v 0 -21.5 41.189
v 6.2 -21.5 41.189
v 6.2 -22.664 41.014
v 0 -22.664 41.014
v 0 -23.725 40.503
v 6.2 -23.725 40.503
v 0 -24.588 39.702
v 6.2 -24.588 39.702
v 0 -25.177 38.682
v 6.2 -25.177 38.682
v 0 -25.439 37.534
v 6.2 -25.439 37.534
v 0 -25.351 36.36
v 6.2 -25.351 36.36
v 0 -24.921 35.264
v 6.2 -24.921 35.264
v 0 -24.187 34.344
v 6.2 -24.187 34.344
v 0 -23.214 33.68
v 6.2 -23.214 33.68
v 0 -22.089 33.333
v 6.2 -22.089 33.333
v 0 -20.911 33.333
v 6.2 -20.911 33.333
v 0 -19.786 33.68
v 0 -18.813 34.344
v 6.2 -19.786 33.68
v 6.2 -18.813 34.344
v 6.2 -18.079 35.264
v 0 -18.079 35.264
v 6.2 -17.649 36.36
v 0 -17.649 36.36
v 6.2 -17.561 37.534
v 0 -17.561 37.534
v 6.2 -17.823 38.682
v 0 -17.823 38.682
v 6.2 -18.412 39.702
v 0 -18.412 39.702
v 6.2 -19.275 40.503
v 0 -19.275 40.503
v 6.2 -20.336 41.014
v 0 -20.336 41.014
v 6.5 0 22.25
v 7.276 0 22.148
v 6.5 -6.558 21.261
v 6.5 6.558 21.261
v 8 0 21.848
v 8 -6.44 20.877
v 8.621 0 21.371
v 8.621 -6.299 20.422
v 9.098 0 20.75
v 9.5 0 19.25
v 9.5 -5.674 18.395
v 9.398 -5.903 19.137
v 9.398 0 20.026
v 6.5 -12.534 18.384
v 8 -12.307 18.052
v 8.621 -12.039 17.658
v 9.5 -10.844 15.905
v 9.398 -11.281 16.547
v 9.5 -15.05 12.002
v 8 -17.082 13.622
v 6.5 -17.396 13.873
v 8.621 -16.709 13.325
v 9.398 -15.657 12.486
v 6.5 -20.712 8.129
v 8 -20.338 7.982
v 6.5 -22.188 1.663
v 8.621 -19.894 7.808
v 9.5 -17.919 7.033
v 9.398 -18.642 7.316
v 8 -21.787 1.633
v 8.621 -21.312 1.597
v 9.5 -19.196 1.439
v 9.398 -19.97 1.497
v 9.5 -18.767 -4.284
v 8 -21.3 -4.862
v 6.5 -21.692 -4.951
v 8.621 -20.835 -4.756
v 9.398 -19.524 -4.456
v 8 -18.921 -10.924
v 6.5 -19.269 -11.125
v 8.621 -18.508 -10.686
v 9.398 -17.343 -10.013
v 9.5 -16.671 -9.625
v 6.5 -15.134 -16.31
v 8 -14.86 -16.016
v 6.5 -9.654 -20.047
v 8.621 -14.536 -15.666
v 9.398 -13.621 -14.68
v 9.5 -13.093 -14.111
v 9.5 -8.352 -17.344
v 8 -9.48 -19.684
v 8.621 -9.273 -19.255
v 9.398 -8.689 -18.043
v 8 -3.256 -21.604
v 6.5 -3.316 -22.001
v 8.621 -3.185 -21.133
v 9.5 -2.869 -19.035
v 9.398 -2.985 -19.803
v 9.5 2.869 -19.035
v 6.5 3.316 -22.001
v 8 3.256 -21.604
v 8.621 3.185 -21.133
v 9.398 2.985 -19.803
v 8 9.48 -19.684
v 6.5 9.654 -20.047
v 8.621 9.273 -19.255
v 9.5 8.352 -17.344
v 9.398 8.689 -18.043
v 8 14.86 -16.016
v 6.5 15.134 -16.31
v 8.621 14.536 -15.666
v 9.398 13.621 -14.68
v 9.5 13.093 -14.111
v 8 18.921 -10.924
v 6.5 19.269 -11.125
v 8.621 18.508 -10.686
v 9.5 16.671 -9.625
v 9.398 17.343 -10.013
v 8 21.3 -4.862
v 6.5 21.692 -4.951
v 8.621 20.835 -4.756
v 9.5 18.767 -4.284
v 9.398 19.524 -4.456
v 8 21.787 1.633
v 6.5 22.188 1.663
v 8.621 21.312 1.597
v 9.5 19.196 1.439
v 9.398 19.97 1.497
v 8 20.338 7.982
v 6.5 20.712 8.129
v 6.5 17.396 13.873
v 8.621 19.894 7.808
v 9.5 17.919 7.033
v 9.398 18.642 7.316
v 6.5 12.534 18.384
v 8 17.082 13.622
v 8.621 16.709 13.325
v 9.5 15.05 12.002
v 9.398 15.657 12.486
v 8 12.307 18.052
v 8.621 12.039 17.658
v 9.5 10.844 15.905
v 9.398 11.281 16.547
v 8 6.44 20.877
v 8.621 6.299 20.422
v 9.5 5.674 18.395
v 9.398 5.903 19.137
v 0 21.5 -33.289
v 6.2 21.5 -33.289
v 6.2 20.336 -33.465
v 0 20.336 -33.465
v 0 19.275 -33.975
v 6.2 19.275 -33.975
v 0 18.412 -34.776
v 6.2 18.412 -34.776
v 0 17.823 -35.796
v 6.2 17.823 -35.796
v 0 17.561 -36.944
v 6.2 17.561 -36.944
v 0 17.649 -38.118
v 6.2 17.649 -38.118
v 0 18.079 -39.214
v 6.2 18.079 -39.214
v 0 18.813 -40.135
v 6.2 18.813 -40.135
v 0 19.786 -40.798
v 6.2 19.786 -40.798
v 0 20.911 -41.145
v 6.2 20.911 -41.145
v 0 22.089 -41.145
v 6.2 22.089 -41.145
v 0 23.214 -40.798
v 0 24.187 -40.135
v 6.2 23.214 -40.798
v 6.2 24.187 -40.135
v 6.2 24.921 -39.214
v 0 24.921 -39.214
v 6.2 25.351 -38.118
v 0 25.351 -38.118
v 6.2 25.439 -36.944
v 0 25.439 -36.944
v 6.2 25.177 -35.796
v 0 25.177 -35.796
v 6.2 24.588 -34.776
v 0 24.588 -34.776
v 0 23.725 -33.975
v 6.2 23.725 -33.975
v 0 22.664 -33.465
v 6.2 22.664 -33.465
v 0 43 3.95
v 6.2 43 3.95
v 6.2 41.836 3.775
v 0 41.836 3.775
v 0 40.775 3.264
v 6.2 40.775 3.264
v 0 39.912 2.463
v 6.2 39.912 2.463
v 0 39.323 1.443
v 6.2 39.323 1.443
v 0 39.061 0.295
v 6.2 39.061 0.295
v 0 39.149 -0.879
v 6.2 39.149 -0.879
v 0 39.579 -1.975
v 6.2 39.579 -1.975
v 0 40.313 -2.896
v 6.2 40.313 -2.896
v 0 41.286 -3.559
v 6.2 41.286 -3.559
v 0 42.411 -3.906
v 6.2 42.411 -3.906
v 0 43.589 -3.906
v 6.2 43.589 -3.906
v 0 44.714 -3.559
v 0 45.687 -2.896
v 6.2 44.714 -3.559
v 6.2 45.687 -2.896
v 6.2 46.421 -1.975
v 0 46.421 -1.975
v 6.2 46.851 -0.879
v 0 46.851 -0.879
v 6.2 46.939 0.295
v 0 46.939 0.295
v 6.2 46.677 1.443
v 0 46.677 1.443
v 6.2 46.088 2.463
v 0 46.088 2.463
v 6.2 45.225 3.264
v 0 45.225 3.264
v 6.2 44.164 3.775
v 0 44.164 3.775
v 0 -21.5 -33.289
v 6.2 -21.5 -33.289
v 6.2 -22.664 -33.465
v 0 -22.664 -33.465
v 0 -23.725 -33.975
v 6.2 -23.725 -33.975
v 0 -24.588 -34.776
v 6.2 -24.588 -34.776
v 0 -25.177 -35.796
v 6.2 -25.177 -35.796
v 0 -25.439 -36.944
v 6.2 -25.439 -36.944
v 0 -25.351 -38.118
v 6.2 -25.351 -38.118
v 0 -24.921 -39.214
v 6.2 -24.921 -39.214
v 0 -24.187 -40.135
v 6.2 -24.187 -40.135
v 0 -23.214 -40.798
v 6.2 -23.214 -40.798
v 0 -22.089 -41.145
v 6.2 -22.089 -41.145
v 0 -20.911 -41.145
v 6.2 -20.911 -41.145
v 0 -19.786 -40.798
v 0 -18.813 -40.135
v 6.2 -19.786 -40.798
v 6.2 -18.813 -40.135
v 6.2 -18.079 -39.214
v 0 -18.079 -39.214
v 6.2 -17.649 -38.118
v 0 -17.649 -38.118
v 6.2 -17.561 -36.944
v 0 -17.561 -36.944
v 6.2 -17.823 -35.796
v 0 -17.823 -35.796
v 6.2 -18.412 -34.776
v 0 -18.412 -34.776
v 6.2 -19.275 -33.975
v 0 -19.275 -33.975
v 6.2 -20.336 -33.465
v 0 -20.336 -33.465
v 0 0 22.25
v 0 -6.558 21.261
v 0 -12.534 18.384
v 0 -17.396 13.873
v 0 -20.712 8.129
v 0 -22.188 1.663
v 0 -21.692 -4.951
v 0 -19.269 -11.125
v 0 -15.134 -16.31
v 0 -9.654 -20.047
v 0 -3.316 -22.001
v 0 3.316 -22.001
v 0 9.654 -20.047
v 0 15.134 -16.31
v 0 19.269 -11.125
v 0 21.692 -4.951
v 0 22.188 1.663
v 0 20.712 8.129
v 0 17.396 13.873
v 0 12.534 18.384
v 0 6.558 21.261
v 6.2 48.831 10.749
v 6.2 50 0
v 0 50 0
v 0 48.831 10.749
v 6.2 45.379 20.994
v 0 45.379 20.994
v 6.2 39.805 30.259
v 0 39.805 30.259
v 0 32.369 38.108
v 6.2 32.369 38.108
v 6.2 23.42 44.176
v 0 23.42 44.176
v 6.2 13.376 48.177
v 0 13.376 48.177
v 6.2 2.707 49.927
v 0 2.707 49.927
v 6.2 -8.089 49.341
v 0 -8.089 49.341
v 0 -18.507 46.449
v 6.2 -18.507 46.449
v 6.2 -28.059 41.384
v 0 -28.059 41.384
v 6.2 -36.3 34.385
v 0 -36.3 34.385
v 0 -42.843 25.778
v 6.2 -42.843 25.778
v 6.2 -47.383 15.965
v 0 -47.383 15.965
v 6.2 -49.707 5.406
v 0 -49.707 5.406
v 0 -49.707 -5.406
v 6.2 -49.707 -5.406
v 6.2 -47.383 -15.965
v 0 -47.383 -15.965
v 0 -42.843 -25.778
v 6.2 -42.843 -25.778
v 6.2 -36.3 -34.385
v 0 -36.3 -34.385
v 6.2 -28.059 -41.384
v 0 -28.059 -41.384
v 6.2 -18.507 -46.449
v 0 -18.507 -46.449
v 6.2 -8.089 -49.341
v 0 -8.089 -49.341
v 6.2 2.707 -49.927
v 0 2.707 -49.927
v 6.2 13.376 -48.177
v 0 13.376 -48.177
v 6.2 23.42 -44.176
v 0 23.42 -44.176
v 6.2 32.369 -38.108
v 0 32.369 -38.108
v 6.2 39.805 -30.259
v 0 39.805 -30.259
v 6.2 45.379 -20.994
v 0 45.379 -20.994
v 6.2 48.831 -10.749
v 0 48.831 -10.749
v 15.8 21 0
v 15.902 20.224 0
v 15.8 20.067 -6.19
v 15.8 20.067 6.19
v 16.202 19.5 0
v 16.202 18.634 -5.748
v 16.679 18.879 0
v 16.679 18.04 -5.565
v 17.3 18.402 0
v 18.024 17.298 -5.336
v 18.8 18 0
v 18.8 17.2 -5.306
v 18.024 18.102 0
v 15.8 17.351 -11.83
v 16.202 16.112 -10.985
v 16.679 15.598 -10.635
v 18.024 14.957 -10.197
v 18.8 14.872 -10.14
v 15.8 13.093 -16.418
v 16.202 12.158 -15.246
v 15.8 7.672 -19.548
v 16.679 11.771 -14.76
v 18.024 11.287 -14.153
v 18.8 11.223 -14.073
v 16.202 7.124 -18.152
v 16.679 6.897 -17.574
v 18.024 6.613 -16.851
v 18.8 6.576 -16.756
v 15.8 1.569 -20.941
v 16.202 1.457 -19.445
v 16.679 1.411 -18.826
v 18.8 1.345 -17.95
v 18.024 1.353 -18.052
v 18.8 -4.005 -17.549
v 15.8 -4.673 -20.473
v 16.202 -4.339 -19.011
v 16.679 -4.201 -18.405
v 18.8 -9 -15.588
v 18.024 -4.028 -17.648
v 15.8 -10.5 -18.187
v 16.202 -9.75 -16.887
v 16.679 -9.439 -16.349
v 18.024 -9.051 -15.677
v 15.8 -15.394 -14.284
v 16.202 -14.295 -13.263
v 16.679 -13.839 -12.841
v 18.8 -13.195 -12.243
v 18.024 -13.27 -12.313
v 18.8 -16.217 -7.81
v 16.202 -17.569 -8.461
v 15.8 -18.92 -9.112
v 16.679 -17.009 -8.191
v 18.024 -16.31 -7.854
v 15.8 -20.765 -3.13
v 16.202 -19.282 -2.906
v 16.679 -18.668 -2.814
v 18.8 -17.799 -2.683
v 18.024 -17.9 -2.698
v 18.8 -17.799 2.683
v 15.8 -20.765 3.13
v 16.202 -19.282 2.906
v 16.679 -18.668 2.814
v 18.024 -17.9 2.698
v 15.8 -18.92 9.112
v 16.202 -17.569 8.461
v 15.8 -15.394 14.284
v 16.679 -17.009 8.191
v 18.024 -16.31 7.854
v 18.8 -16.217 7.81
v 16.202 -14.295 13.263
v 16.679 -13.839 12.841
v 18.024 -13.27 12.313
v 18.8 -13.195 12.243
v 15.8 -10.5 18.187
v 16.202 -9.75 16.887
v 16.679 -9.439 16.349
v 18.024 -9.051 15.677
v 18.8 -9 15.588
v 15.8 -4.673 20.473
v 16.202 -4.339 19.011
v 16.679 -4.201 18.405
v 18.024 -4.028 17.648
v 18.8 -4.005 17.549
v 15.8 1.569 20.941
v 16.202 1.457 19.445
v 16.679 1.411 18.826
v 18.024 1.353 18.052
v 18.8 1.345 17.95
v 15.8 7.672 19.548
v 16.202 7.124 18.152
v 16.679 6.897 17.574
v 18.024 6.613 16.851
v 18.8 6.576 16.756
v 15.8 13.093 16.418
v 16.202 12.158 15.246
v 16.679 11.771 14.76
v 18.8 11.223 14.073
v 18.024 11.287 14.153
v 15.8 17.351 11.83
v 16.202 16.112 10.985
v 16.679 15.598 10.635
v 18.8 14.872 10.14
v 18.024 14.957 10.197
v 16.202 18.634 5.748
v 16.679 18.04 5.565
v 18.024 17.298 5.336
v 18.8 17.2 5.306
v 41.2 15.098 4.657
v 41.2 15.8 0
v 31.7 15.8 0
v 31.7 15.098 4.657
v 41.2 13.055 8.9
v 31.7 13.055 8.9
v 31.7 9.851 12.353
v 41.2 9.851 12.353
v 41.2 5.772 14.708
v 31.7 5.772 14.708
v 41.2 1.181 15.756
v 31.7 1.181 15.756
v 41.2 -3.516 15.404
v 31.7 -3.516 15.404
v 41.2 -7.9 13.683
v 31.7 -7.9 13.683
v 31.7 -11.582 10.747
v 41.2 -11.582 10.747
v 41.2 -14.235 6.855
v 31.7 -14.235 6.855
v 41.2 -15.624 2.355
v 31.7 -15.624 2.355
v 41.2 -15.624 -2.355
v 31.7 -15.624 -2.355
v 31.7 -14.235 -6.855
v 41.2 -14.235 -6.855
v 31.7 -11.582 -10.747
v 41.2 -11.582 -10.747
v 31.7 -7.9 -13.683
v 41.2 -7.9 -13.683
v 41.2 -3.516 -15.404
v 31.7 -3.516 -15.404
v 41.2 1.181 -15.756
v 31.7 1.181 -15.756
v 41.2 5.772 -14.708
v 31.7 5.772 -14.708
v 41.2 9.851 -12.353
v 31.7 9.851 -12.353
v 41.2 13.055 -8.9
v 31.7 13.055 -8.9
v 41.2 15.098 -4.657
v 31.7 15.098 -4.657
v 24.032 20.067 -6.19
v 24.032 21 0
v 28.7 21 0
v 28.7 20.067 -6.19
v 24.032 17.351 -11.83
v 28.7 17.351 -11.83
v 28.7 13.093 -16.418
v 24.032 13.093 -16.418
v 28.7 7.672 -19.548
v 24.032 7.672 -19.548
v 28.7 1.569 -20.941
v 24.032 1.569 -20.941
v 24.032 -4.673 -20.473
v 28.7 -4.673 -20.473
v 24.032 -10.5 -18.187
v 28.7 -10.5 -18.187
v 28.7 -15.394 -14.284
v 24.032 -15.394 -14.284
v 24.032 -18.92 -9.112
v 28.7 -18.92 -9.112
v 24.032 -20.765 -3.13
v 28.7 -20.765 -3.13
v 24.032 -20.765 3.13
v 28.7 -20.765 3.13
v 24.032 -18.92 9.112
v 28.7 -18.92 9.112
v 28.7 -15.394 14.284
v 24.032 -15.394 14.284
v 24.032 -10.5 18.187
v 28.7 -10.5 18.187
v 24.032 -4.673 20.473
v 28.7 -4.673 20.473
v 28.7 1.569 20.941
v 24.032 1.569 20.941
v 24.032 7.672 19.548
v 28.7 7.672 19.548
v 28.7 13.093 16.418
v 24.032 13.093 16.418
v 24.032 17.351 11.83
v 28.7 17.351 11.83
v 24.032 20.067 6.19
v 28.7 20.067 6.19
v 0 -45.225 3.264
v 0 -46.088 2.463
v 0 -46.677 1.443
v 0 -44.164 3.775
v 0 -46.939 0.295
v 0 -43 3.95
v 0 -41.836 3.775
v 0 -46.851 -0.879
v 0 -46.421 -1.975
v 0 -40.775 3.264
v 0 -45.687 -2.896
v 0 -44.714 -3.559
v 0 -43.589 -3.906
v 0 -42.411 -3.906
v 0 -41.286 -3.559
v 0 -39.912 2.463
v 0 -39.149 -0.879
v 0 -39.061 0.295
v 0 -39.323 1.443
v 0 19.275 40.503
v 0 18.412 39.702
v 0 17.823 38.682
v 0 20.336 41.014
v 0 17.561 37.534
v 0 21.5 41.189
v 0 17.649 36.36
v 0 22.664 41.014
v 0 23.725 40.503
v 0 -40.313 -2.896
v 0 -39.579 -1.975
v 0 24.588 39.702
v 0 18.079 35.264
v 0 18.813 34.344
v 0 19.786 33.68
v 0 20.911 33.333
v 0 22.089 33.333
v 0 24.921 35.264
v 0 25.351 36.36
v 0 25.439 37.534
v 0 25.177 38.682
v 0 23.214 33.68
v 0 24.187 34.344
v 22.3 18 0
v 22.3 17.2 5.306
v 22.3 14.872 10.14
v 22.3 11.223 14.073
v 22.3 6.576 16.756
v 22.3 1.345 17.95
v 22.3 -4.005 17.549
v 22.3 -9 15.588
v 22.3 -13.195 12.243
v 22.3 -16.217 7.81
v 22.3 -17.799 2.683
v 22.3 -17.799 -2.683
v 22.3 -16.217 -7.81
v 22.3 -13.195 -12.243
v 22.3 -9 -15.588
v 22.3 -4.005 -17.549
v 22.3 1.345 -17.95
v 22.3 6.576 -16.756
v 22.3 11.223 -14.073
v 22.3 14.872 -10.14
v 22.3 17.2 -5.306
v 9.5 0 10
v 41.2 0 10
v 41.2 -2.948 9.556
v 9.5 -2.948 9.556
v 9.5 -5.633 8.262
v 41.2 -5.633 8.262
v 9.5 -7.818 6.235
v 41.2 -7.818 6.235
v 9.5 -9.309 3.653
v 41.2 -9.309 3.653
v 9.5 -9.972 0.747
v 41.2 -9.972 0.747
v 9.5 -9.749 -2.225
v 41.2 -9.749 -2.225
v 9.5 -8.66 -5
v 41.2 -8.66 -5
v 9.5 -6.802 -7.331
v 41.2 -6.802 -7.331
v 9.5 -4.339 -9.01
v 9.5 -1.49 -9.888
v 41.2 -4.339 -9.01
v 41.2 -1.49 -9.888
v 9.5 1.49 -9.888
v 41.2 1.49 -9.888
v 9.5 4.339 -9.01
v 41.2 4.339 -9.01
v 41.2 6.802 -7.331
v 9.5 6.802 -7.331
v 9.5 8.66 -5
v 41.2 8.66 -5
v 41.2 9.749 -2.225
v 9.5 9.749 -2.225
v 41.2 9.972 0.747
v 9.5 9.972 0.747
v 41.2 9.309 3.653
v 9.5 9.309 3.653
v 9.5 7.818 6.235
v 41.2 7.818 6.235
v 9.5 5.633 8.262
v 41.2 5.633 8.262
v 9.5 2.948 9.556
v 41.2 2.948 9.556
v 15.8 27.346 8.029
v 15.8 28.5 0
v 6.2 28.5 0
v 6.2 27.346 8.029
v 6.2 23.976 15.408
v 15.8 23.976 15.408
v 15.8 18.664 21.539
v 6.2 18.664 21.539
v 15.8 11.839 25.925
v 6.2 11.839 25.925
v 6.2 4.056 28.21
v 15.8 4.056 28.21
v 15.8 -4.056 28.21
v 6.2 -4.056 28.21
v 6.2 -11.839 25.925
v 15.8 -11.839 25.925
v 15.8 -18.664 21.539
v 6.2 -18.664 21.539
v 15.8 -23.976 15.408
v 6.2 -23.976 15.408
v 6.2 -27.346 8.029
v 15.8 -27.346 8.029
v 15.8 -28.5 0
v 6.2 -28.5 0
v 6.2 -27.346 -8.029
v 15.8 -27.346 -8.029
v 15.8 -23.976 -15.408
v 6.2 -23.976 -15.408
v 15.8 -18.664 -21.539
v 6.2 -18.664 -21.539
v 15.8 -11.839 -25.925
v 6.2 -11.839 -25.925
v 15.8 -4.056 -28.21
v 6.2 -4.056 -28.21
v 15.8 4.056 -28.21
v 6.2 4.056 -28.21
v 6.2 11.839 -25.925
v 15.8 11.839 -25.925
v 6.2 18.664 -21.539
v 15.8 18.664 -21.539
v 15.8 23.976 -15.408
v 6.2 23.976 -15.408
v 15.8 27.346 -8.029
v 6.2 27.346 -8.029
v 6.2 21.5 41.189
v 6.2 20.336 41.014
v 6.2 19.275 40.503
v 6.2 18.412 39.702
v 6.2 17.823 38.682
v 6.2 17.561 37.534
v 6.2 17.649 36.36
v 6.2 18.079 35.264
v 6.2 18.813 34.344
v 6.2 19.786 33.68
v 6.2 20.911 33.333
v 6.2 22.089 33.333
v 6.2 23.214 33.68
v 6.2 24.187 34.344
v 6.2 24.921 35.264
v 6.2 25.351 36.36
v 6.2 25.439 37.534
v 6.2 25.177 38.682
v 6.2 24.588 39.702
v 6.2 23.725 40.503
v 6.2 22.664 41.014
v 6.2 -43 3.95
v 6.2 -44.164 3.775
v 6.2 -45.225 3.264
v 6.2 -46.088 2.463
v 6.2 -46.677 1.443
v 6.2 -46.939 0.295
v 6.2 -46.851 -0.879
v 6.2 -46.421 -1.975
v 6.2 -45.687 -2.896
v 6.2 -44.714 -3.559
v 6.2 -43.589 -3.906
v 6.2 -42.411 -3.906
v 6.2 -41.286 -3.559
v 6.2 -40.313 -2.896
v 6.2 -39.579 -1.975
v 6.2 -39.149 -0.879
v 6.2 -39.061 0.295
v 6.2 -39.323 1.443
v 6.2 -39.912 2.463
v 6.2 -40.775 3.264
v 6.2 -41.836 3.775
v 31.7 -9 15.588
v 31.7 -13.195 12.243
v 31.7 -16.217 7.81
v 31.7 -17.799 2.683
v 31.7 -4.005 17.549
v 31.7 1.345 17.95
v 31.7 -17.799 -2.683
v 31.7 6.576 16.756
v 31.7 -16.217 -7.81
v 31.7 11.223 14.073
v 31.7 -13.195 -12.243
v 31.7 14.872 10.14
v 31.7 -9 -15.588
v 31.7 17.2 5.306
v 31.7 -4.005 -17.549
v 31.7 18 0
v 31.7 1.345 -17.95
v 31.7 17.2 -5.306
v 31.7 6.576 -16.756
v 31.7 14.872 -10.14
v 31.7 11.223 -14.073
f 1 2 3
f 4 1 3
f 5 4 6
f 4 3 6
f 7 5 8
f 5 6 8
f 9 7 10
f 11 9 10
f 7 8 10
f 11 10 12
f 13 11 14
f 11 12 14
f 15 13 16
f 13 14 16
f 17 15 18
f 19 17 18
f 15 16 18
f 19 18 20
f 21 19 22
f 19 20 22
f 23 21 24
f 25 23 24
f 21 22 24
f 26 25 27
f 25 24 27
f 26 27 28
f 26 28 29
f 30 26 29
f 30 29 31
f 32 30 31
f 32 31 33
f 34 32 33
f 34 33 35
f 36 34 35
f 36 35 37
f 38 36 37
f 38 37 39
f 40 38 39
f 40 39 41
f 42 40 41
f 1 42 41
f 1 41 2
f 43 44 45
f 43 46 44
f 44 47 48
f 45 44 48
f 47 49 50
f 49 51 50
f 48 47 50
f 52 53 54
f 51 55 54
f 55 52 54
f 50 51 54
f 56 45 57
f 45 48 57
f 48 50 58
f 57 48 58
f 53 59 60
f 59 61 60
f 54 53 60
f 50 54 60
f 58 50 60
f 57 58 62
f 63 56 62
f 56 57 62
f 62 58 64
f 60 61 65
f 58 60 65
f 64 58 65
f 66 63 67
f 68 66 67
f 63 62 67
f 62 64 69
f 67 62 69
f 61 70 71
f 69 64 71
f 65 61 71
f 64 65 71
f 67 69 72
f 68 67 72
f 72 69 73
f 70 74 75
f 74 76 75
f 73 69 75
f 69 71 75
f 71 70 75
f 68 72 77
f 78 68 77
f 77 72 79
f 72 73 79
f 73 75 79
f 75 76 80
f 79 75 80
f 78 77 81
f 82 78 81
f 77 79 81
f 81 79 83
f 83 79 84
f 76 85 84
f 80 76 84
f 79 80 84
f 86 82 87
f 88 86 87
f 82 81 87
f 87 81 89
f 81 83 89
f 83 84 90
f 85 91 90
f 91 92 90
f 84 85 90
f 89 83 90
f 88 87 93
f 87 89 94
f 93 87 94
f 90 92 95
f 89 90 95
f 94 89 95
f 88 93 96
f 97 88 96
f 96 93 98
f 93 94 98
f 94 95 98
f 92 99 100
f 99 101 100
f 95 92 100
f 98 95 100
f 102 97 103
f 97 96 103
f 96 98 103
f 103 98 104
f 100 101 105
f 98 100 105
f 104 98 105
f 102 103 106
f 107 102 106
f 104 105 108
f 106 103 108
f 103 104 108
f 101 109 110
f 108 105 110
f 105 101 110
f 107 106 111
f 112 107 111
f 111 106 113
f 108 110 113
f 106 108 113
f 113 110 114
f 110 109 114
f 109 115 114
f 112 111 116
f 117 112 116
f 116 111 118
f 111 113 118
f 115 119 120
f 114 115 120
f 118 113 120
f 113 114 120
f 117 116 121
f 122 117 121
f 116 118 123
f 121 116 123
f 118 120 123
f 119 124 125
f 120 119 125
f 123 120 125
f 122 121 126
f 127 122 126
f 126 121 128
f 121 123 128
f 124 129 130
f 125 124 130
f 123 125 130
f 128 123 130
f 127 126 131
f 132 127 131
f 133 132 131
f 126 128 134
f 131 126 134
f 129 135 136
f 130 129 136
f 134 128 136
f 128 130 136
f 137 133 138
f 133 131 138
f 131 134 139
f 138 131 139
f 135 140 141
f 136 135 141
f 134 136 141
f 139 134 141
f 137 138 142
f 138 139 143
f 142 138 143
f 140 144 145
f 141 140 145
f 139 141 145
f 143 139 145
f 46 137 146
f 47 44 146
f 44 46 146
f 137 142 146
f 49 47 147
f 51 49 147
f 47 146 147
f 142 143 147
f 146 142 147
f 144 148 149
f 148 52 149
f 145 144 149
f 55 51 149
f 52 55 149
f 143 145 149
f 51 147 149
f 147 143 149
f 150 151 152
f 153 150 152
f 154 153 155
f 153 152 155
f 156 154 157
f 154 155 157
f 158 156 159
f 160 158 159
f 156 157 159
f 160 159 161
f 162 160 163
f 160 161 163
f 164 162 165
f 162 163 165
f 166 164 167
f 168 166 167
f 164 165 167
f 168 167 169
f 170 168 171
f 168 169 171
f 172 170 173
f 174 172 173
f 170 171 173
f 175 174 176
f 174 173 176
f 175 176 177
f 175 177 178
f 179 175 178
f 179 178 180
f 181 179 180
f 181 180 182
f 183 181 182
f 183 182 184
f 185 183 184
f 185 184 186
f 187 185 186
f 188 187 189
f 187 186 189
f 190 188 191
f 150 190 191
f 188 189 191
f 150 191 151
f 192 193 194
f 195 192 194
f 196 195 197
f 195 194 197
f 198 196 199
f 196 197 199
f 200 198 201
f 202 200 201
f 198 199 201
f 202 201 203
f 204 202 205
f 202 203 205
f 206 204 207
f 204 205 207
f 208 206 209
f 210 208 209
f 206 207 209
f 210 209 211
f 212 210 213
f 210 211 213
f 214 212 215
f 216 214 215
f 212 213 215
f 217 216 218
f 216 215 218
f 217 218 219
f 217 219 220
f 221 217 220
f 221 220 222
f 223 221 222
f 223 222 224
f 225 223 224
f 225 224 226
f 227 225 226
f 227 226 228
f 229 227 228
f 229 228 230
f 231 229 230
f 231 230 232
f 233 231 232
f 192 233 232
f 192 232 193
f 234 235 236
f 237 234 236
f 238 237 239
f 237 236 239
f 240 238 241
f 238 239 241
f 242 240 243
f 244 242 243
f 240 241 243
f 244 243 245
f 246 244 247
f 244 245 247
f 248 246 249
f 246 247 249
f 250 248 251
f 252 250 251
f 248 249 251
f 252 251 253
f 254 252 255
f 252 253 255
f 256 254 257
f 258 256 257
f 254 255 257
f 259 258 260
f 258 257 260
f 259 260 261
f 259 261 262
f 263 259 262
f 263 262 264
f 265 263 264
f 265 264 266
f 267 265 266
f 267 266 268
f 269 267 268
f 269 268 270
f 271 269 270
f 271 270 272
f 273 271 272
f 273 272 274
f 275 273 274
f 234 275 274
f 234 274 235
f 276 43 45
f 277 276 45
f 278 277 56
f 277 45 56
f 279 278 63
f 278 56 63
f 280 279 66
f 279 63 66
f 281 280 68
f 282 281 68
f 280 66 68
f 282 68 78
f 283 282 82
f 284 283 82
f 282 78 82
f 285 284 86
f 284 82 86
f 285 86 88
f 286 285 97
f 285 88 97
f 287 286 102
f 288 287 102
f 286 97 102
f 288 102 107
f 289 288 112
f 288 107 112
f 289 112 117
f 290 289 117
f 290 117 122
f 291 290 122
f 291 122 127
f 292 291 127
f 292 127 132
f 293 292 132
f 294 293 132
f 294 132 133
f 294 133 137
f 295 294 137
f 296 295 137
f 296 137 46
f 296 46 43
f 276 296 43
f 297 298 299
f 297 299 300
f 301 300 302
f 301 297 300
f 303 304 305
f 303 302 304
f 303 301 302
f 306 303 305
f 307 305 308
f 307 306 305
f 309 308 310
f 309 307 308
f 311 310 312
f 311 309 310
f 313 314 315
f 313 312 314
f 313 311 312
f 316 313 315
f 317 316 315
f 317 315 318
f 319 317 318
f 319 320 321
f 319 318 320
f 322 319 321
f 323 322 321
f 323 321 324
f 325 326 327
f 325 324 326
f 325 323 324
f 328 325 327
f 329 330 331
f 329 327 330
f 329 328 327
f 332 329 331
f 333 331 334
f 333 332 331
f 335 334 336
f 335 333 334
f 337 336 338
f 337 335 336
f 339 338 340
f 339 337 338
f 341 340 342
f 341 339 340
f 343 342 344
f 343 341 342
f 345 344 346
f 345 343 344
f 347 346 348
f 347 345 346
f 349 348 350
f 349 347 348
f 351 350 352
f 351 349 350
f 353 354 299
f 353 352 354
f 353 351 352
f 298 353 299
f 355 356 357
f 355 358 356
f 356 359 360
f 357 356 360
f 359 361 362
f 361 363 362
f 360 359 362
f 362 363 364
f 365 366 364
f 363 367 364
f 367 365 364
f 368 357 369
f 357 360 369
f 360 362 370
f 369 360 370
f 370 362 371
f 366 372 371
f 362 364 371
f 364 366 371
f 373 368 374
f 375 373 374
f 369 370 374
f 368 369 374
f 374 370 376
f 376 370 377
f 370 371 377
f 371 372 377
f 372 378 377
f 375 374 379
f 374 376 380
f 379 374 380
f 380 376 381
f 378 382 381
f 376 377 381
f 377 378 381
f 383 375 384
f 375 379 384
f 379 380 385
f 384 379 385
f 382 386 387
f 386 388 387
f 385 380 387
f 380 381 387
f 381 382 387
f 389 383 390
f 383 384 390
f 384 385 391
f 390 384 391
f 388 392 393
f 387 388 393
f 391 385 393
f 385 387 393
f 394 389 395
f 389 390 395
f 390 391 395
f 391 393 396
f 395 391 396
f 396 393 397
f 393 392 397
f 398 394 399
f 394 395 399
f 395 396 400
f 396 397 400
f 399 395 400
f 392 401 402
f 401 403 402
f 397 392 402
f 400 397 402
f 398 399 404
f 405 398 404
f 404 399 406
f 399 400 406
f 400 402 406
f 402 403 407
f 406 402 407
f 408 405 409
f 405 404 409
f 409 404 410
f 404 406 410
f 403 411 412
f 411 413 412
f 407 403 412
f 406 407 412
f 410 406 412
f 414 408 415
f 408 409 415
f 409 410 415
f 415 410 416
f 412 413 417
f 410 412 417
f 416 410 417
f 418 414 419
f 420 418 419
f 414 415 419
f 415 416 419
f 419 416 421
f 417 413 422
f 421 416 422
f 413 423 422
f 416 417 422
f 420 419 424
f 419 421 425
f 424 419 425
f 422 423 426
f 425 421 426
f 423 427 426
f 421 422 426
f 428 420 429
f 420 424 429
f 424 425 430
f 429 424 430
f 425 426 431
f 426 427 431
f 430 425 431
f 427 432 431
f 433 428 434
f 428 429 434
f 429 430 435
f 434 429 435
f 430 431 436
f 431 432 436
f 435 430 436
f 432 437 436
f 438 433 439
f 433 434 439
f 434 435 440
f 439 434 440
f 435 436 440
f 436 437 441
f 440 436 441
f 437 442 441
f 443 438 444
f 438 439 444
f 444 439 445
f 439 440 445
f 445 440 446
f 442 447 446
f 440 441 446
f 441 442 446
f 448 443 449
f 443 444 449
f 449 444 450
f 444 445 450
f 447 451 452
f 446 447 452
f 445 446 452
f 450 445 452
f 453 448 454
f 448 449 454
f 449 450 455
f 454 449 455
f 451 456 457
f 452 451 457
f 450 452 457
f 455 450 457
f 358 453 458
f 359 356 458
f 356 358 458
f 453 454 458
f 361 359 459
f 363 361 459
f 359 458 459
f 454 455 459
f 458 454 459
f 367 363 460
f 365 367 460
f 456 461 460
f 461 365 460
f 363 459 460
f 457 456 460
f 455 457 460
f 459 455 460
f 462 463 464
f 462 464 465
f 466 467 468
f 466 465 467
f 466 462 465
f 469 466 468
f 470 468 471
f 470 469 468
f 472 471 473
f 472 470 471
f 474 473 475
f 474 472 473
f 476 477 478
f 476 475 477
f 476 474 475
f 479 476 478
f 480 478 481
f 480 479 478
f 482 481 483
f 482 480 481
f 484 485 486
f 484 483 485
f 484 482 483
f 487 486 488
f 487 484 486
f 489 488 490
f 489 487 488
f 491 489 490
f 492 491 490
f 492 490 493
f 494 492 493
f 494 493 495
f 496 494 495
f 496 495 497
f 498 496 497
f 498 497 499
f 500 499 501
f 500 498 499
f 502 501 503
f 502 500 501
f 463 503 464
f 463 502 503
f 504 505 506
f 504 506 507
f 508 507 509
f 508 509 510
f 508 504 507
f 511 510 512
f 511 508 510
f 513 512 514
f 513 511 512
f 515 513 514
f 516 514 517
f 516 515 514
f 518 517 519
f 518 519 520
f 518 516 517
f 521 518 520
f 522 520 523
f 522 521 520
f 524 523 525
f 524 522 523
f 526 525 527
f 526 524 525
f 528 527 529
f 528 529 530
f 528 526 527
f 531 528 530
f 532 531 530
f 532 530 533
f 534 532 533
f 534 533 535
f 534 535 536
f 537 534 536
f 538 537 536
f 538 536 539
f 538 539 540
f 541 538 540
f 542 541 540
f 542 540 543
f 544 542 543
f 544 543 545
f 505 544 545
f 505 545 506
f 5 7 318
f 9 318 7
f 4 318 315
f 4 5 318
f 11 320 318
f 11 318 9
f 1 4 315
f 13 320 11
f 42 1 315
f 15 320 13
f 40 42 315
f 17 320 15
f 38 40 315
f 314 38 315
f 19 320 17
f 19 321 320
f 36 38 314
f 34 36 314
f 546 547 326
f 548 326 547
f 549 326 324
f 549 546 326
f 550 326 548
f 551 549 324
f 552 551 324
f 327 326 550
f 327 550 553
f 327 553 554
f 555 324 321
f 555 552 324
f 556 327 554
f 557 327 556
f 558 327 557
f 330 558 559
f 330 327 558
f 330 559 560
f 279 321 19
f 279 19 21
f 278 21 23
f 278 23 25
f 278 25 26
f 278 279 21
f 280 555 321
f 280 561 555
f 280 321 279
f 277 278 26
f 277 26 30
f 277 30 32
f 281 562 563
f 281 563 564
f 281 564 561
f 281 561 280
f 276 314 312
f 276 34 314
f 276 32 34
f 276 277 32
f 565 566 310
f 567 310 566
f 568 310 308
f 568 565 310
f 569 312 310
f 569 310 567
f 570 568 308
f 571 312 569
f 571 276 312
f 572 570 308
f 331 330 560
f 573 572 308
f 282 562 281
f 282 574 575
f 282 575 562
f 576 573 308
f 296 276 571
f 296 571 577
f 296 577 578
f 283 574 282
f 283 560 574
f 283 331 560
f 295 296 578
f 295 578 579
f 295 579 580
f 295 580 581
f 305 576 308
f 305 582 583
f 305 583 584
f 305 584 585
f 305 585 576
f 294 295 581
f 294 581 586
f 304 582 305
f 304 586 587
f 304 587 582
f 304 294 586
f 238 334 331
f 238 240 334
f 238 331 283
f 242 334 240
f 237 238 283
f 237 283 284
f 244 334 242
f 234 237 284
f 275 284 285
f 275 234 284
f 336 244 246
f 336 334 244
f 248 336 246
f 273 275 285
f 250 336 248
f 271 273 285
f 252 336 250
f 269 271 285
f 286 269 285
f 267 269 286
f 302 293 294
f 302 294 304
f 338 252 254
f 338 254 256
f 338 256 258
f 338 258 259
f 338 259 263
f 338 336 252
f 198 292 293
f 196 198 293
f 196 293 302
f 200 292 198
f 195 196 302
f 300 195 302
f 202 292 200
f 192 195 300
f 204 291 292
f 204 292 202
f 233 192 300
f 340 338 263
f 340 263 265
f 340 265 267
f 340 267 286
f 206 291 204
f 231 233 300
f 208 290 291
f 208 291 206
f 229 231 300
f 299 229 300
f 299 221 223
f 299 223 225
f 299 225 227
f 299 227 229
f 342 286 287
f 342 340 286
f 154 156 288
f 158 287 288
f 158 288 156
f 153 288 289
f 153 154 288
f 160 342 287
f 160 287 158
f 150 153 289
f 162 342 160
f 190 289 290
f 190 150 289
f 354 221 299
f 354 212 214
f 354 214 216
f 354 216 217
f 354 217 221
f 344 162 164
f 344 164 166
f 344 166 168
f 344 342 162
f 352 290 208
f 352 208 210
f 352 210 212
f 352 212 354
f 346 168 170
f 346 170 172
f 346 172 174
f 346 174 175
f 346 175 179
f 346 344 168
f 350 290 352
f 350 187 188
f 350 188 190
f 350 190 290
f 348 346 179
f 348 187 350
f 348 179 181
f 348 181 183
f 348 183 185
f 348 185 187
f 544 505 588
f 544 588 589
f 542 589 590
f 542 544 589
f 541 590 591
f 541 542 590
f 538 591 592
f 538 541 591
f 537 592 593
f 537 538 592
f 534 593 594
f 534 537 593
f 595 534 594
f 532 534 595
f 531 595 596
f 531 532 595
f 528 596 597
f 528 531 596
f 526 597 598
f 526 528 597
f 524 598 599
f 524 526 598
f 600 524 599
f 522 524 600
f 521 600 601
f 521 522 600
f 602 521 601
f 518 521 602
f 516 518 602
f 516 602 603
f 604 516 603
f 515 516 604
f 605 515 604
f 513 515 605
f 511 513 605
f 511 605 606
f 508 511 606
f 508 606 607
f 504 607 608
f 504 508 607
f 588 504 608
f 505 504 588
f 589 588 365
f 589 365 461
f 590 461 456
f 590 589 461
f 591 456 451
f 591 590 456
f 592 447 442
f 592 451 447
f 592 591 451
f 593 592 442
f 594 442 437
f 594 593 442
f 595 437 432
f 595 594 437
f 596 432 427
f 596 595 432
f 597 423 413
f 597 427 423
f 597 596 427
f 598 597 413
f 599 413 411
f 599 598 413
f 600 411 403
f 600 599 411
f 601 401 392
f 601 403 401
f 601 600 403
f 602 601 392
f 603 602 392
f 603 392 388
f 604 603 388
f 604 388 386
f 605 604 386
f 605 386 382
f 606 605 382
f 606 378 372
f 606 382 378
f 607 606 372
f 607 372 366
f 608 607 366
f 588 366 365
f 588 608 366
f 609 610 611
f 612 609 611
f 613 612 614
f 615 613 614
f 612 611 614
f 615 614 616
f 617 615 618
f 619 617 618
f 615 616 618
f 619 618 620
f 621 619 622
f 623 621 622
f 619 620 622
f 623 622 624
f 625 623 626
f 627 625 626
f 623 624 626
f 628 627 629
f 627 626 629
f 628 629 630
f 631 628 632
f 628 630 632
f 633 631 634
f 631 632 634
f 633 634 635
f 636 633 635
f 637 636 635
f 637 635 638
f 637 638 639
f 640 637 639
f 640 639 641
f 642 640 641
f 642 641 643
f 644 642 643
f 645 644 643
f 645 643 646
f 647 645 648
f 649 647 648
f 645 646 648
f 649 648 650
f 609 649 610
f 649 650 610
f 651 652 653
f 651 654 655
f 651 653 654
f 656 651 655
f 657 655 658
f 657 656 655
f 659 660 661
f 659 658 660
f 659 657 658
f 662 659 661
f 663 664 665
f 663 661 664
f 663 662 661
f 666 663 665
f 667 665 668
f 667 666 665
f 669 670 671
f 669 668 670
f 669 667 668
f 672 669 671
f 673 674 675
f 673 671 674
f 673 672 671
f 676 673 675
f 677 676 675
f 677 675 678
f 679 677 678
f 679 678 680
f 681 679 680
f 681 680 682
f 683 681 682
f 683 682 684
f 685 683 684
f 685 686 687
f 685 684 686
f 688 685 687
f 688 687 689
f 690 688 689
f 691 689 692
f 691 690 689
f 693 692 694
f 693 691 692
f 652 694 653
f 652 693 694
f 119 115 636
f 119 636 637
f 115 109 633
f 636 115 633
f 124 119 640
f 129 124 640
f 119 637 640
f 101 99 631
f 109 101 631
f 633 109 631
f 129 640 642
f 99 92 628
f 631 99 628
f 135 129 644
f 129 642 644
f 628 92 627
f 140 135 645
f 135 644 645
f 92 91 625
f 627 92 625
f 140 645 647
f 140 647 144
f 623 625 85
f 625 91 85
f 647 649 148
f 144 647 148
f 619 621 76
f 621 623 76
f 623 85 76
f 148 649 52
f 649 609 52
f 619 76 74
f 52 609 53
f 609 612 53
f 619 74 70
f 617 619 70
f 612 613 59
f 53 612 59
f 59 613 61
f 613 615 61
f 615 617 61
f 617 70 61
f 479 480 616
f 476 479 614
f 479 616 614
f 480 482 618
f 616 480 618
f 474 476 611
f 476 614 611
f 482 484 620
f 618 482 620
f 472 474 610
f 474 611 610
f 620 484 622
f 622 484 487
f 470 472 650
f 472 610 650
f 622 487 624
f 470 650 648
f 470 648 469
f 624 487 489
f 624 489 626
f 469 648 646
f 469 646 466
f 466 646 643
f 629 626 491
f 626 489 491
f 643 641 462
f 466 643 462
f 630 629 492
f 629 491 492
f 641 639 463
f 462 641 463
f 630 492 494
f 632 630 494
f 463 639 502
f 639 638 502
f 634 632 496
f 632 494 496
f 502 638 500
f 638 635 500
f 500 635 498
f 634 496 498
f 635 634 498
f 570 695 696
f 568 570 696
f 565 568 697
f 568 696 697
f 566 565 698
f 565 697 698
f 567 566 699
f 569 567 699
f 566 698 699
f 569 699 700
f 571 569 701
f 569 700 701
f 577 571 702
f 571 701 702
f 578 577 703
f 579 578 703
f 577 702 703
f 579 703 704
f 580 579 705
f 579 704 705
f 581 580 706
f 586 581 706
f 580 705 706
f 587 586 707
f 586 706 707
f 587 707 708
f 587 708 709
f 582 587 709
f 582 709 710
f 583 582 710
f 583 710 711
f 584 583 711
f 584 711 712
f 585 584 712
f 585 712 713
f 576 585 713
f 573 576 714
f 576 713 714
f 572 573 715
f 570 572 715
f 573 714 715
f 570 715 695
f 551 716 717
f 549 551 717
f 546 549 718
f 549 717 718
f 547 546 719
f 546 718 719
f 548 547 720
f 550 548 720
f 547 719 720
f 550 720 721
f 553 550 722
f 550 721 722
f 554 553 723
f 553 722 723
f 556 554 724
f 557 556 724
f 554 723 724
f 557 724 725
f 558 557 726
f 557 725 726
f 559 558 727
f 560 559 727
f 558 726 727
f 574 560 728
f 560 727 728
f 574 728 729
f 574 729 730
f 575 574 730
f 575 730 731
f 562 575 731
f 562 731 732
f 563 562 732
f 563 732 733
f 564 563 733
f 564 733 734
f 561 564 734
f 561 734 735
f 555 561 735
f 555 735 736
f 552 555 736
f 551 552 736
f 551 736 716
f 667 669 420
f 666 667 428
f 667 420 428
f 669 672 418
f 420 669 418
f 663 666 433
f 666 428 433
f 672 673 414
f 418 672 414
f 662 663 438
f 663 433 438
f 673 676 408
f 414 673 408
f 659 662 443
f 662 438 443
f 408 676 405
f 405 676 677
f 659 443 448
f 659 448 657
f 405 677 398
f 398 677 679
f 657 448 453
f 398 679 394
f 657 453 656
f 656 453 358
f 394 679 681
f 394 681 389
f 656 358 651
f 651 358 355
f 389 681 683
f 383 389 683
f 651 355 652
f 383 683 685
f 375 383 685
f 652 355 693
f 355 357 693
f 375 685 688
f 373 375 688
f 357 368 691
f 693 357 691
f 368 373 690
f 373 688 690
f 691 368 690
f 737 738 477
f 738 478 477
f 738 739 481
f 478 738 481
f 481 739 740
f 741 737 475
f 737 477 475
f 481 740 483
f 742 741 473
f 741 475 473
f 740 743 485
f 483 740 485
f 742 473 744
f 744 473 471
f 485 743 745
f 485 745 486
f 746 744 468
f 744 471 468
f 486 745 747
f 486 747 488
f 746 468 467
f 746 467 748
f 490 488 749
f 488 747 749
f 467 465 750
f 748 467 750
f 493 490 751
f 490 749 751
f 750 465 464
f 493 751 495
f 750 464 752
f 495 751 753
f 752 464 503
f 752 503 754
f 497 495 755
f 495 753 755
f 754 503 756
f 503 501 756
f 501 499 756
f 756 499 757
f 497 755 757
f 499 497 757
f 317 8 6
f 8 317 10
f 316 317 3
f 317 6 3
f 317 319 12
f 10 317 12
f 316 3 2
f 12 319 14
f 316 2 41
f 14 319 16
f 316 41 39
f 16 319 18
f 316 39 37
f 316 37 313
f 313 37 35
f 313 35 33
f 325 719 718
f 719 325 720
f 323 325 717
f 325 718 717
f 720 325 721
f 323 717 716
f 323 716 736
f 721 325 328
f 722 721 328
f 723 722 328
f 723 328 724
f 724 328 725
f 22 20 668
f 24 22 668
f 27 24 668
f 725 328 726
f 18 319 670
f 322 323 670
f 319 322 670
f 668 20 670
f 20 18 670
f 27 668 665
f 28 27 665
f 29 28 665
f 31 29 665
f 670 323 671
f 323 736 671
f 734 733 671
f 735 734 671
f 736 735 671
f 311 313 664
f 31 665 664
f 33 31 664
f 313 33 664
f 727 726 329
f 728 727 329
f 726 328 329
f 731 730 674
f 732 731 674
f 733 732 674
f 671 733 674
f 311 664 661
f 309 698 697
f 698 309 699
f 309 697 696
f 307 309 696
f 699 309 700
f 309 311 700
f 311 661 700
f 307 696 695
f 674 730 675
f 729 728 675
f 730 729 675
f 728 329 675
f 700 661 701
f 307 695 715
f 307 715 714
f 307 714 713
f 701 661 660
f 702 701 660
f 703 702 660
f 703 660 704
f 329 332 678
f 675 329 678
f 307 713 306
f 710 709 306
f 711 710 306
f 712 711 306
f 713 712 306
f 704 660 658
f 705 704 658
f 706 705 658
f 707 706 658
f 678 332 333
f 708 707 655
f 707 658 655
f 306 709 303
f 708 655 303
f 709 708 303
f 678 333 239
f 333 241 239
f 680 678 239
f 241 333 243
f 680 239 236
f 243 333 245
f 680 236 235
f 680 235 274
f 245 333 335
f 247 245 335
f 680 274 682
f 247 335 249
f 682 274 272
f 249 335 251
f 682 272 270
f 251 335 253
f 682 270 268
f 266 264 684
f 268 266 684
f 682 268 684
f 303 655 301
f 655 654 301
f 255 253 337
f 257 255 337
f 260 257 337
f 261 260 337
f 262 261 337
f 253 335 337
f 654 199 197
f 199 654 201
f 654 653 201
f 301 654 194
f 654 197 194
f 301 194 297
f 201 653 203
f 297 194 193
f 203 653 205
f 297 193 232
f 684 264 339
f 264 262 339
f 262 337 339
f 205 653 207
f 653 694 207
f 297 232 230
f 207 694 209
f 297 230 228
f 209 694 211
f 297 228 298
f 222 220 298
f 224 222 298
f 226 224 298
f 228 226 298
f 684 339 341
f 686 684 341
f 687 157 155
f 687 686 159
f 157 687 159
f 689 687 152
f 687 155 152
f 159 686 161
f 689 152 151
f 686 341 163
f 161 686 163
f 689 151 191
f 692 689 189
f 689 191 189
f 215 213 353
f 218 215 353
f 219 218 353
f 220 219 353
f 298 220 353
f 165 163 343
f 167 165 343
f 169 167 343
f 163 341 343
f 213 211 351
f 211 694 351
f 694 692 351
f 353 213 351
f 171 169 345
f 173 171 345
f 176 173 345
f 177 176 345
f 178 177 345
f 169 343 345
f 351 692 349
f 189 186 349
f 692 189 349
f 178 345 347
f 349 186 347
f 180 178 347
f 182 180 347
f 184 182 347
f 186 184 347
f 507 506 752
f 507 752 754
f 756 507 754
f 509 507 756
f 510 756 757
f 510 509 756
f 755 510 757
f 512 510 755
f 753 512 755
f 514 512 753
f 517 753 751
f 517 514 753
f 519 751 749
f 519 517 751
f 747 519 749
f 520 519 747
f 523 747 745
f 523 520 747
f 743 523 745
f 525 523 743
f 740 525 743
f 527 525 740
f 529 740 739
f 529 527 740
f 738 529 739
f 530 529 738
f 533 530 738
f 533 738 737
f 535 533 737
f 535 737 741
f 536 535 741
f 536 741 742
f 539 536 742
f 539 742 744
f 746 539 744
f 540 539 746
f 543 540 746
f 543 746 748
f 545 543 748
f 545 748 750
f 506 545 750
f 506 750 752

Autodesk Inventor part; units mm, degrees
ref_plane "YZ Plane" through (0, 0, 0) normal (1, 0, 0) x (0, 1, 0)
ref_plane "XZ Plane" through (0, 0, 0) normal (0, 1, 0) x (-1, 0, 0)
ref_plane "XY Plane" through (0, 0, 0) normal (0, 0, 1) x (1, 0, 0)
sketch "Boceto1" plane through (0, 0, 0) normal (0, 0, 1) x (1, 0, 0)
  line L0 (0, 0) -> (0, 50)
  line L1 (0, 50) -> (6.2, 50)
  line L2 (6.2, 50) -> (6.2, 28.5)
  line L3 (6.2, 28.5) -> (15.8, 28.5)
  line L4 (15.8, 28.5) -> (15.8, 21)
  line L5 (18.8, 18) -> (22.3, 18)
  line L6 (22.3, 18) -> (22.3, 21.9094) construction
  line L7 (41.2, 0) -> (0, 0)
  arc A0 (15.8, 21) -> (18.8, 18) centre (18.8, 21) ccw
  line L8 (22.3, 18) -> (28.4018, 18) construction
  line L9 (28.7, 21) -> (24.0321, 21)
  line L10 (22.3, 18) -> (24.0321, 21)
  line L11 (22.3, 18) -> (25.7641, 18) construction
  line L12 (59.327, 18) -> (29.2282, 18) construction
  line L13 (31.7, 18) -> (31.7, 21) construction
  line L14 (31.7, 18) -> (28.7, 21)
  line L15 (31.7, 18) -> (35.9426, 18) construction
  line L16 (31.7, 18) -> (41.2, 18) construction
  line L17 (41.2, 15.8) -> (41.2, 0)
  line L18 (31.7, 18) -> (31.7, 0)
  line L19 (31.7, 15.8) -> (41.2, 15.8)
  line L20 (22.3, 18) -> (22.3, 0)
  point P0 (15.8, 18)
  dimension "d0" = 50
  dimension "d1" = 6.2
  dimension "d2" = 9.6
  dimension "d3" = 28.5
  dimension "d4" = 6.5
  dimension "d5" = 3
  dimension "d8" = 18
  dimension "d10" = 21
  dimension "d11" = 60
  dimension "d12" = 18
  dimension "d14" = 9.4
  dimension "d15" = 135
  dimension "d16" = 9.5
  dimension "d17" = 41.2
  dimension "d18" = 15.8
revolve "Revolución1" add sketch "Boceto1" angle 360 about axis through (41.2, 0, 0) along (-1, 0, 0)
sketch "Boceto2" plane through (0, 0, 0) normal (-1, 0, 0) x (0, 0, 1)
  circle A0 centre (0, 0) radius 28.5 projected
  point P0 (0, 0)
hole "Agujero1" at (0, 0, 0) direction (1, 0, 0) diameter 20 end through all counterbore diameter 44.5 counterbore depth 9.5
sketch "Boceto3" plane through (0, 0, 0) normal (-1, 0, 0) x (0, 0, 1)
  point P0 (0, 0)
  point P1 (0, 43)
  point P2 (-37.2391, 21.5)
  point P3 (-37.2391, -21.5)
  point P4 (0, -43)
  point P5 (37.2391, -21.5)
  point P6 (37.2391, 21.5)
  dimension "d27" = 43
  dimension "d37" = 360
hole "Agujero2" at (0, 43, 0) at (0, 21.5, 37.2391) at (0, -21.5, 37.2391) at (0, -43, 0) at (0, -21.5, -37.2391) at (0, 21.5, -37.2391) direction (1, 0, 0) diameter 7.9 end through all
thread "Rosca1" size "M42x1.5" class "6g" standard "ANSI Metric M Profile" full length
fillet "Empalme1" radius 3 1 edges at (9.5, 0, -22.25)
properties part number "Lab15_A01209499" material "Acero, carbono"
